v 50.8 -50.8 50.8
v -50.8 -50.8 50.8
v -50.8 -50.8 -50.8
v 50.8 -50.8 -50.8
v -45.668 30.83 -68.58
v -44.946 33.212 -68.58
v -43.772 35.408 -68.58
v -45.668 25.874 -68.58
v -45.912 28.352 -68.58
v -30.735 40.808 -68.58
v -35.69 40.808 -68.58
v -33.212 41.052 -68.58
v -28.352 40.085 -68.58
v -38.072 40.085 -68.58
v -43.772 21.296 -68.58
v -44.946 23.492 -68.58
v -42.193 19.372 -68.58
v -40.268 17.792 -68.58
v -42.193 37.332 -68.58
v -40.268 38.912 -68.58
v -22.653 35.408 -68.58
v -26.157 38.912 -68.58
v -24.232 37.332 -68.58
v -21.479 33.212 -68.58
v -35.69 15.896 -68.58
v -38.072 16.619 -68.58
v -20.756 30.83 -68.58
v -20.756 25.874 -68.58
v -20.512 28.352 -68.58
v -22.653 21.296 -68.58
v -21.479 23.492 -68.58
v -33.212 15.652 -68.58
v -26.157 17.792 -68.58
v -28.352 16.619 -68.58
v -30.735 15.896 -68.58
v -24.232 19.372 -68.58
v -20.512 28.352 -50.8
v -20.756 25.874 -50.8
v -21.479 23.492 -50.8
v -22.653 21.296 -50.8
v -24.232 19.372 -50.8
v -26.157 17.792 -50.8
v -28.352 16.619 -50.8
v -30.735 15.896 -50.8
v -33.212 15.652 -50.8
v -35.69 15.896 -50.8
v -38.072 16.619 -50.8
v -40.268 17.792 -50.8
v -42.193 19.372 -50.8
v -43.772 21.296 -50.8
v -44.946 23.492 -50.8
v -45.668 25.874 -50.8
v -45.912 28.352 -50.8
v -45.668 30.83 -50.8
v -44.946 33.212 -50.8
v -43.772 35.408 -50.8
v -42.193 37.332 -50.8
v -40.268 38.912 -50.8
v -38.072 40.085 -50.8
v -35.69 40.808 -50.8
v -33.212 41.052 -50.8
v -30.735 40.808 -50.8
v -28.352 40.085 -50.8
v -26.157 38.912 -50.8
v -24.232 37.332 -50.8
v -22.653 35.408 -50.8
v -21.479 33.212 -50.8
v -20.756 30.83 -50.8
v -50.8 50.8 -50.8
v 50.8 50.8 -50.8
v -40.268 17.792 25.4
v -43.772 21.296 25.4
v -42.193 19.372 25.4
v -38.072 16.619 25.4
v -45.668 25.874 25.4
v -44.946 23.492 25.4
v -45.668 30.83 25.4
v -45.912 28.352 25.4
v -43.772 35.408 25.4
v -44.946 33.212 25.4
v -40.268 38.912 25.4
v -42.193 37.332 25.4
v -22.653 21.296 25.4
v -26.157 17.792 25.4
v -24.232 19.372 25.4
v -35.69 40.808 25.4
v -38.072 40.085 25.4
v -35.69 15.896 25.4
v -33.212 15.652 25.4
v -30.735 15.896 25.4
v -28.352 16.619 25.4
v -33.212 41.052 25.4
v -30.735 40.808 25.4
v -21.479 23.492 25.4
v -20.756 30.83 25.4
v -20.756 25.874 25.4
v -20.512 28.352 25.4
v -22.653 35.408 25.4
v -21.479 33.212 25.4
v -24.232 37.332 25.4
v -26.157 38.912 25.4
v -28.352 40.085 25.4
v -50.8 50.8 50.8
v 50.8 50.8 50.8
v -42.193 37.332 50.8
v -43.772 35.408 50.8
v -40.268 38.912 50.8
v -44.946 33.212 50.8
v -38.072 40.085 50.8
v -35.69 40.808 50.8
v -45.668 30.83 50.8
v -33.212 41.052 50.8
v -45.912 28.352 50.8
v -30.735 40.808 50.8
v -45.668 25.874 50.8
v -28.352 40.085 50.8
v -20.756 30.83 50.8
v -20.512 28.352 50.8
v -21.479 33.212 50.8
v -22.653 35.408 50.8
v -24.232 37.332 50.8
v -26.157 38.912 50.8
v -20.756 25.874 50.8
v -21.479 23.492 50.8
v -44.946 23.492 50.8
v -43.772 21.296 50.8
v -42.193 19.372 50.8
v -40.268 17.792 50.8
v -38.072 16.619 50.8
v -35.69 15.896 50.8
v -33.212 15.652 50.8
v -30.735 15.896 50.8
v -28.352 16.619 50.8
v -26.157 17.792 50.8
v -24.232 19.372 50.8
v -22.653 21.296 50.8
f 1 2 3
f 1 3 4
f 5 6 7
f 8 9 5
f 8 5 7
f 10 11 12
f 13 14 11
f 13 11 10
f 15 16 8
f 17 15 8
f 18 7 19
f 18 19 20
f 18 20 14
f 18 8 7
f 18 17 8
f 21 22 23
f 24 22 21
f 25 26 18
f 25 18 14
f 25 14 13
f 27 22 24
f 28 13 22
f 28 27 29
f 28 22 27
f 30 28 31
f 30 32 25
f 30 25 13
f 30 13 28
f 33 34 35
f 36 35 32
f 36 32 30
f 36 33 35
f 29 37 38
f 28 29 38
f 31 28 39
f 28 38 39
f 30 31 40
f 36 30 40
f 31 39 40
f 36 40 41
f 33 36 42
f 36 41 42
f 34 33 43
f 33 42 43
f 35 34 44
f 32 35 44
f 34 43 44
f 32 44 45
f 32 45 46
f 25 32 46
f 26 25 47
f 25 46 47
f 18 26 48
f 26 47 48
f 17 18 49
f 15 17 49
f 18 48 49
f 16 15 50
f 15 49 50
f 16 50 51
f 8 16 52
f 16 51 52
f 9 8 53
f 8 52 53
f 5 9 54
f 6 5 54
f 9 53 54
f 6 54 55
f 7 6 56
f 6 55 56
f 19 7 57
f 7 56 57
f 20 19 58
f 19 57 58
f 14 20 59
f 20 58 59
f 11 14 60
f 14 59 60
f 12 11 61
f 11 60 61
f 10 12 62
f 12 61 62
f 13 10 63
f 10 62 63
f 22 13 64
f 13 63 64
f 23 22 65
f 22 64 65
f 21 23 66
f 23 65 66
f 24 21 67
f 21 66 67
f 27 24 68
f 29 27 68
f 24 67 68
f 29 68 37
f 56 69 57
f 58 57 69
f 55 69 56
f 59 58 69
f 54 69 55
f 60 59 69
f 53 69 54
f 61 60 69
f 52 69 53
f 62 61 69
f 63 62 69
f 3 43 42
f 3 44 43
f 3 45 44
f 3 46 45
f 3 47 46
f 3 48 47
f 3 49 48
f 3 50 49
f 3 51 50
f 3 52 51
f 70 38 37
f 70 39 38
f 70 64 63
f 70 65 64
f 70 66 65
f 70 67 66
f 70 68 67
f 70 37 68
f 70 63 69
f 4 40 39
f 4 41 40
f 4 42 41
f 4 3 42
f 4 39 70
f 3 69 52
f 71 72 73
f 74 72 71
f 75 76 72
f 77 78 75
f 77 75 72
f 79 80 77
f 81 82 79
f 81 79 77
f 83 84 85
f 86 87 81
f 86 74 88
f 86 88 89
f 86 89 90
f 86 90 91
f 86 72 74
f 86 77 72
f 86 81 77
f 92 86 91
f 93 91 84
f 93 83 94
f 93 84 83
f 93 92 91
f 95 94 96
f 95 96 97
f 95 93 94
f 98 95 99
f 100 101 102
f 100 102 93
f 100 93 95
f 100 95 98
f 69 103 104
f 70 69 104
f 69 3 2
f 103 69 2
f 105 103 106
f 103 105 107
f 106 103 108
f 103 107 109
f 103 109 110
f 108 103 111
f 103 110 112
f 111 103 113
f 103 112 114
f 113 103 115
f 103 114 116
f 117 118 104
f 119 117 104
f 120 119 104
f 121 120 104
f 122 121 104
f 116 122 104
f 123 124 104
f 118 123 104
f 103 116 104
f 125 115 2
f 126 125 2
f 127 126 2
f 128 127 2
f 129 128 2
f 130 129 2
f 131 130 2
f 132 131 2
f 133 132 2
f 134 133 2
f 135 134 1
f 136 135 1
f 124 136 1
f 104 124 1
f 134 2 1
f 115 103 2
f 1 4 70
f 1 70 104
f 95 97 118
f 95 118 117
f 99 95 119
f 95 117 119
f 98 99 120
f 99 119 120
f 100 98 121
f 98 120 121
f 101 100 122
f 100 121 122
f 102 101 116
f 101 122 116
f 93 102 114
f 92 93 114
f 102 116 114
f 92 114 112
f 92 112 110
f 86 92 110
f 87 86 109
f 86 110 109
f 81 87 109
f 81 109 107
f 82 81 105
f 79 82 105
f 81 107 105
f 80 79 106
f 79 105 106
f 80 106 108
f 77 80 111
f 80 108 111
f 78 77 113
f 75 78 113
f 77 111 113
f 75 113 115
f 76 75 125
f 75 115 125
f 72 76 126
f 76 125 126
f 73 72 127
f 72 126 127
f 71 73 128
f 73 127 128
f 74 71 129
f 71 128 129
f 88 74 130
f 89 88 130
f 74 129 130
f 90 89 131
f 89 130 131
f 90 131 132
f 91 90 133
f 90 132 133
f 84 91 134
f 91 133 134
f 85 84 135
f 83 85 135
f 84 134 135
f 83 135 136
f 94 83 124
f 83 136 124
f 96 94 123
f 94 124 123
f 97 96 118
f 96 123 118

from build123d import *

# Parameters (mm, degrees)
F1_W     = 101.6
F1_H     = 101.6
F2_DEPTH = 50.8
F3_R     = 12.7
F4_DEPTH = 25.4
F5_R     = 12.7
F6_DEPTH = 17.78


# Not quite as in the source:
# - a variable given as a bare number and used for a length is read in inches; the dataset says mm whatever the document's units were


with BuildPart() as f2:
    # F1 (on Front) → F2 (new body, symmetric)
    with BuildSketch(Plane.XZ):
        Rectangle(F1_W, F1_H)
    extrude(amount=F2_DEPTH, both=True)

    # F3 (on face) → F4 (cut)
    with BuildSketch(Plane.XY.offset(50.8)):
        with Locations((-33.2122892141, 28.3519532531)):
            Circle(F3_R)
    extrude(amount=-F4_DEPTH, mode=Mode.SUBTRACT)

    # F5 (on face) → F6 (join)
    with BuildSketch(Plane(origin=(0, 0, -50.8), x_dir=(1, 0, 0), z_dir=(0, 0, -1))):
        with Locations((-33.2122892141, -28.3519532531)):
            Circle(F5_R)
    extrude(amount=F6_DEPTH)


solid = f2.part
